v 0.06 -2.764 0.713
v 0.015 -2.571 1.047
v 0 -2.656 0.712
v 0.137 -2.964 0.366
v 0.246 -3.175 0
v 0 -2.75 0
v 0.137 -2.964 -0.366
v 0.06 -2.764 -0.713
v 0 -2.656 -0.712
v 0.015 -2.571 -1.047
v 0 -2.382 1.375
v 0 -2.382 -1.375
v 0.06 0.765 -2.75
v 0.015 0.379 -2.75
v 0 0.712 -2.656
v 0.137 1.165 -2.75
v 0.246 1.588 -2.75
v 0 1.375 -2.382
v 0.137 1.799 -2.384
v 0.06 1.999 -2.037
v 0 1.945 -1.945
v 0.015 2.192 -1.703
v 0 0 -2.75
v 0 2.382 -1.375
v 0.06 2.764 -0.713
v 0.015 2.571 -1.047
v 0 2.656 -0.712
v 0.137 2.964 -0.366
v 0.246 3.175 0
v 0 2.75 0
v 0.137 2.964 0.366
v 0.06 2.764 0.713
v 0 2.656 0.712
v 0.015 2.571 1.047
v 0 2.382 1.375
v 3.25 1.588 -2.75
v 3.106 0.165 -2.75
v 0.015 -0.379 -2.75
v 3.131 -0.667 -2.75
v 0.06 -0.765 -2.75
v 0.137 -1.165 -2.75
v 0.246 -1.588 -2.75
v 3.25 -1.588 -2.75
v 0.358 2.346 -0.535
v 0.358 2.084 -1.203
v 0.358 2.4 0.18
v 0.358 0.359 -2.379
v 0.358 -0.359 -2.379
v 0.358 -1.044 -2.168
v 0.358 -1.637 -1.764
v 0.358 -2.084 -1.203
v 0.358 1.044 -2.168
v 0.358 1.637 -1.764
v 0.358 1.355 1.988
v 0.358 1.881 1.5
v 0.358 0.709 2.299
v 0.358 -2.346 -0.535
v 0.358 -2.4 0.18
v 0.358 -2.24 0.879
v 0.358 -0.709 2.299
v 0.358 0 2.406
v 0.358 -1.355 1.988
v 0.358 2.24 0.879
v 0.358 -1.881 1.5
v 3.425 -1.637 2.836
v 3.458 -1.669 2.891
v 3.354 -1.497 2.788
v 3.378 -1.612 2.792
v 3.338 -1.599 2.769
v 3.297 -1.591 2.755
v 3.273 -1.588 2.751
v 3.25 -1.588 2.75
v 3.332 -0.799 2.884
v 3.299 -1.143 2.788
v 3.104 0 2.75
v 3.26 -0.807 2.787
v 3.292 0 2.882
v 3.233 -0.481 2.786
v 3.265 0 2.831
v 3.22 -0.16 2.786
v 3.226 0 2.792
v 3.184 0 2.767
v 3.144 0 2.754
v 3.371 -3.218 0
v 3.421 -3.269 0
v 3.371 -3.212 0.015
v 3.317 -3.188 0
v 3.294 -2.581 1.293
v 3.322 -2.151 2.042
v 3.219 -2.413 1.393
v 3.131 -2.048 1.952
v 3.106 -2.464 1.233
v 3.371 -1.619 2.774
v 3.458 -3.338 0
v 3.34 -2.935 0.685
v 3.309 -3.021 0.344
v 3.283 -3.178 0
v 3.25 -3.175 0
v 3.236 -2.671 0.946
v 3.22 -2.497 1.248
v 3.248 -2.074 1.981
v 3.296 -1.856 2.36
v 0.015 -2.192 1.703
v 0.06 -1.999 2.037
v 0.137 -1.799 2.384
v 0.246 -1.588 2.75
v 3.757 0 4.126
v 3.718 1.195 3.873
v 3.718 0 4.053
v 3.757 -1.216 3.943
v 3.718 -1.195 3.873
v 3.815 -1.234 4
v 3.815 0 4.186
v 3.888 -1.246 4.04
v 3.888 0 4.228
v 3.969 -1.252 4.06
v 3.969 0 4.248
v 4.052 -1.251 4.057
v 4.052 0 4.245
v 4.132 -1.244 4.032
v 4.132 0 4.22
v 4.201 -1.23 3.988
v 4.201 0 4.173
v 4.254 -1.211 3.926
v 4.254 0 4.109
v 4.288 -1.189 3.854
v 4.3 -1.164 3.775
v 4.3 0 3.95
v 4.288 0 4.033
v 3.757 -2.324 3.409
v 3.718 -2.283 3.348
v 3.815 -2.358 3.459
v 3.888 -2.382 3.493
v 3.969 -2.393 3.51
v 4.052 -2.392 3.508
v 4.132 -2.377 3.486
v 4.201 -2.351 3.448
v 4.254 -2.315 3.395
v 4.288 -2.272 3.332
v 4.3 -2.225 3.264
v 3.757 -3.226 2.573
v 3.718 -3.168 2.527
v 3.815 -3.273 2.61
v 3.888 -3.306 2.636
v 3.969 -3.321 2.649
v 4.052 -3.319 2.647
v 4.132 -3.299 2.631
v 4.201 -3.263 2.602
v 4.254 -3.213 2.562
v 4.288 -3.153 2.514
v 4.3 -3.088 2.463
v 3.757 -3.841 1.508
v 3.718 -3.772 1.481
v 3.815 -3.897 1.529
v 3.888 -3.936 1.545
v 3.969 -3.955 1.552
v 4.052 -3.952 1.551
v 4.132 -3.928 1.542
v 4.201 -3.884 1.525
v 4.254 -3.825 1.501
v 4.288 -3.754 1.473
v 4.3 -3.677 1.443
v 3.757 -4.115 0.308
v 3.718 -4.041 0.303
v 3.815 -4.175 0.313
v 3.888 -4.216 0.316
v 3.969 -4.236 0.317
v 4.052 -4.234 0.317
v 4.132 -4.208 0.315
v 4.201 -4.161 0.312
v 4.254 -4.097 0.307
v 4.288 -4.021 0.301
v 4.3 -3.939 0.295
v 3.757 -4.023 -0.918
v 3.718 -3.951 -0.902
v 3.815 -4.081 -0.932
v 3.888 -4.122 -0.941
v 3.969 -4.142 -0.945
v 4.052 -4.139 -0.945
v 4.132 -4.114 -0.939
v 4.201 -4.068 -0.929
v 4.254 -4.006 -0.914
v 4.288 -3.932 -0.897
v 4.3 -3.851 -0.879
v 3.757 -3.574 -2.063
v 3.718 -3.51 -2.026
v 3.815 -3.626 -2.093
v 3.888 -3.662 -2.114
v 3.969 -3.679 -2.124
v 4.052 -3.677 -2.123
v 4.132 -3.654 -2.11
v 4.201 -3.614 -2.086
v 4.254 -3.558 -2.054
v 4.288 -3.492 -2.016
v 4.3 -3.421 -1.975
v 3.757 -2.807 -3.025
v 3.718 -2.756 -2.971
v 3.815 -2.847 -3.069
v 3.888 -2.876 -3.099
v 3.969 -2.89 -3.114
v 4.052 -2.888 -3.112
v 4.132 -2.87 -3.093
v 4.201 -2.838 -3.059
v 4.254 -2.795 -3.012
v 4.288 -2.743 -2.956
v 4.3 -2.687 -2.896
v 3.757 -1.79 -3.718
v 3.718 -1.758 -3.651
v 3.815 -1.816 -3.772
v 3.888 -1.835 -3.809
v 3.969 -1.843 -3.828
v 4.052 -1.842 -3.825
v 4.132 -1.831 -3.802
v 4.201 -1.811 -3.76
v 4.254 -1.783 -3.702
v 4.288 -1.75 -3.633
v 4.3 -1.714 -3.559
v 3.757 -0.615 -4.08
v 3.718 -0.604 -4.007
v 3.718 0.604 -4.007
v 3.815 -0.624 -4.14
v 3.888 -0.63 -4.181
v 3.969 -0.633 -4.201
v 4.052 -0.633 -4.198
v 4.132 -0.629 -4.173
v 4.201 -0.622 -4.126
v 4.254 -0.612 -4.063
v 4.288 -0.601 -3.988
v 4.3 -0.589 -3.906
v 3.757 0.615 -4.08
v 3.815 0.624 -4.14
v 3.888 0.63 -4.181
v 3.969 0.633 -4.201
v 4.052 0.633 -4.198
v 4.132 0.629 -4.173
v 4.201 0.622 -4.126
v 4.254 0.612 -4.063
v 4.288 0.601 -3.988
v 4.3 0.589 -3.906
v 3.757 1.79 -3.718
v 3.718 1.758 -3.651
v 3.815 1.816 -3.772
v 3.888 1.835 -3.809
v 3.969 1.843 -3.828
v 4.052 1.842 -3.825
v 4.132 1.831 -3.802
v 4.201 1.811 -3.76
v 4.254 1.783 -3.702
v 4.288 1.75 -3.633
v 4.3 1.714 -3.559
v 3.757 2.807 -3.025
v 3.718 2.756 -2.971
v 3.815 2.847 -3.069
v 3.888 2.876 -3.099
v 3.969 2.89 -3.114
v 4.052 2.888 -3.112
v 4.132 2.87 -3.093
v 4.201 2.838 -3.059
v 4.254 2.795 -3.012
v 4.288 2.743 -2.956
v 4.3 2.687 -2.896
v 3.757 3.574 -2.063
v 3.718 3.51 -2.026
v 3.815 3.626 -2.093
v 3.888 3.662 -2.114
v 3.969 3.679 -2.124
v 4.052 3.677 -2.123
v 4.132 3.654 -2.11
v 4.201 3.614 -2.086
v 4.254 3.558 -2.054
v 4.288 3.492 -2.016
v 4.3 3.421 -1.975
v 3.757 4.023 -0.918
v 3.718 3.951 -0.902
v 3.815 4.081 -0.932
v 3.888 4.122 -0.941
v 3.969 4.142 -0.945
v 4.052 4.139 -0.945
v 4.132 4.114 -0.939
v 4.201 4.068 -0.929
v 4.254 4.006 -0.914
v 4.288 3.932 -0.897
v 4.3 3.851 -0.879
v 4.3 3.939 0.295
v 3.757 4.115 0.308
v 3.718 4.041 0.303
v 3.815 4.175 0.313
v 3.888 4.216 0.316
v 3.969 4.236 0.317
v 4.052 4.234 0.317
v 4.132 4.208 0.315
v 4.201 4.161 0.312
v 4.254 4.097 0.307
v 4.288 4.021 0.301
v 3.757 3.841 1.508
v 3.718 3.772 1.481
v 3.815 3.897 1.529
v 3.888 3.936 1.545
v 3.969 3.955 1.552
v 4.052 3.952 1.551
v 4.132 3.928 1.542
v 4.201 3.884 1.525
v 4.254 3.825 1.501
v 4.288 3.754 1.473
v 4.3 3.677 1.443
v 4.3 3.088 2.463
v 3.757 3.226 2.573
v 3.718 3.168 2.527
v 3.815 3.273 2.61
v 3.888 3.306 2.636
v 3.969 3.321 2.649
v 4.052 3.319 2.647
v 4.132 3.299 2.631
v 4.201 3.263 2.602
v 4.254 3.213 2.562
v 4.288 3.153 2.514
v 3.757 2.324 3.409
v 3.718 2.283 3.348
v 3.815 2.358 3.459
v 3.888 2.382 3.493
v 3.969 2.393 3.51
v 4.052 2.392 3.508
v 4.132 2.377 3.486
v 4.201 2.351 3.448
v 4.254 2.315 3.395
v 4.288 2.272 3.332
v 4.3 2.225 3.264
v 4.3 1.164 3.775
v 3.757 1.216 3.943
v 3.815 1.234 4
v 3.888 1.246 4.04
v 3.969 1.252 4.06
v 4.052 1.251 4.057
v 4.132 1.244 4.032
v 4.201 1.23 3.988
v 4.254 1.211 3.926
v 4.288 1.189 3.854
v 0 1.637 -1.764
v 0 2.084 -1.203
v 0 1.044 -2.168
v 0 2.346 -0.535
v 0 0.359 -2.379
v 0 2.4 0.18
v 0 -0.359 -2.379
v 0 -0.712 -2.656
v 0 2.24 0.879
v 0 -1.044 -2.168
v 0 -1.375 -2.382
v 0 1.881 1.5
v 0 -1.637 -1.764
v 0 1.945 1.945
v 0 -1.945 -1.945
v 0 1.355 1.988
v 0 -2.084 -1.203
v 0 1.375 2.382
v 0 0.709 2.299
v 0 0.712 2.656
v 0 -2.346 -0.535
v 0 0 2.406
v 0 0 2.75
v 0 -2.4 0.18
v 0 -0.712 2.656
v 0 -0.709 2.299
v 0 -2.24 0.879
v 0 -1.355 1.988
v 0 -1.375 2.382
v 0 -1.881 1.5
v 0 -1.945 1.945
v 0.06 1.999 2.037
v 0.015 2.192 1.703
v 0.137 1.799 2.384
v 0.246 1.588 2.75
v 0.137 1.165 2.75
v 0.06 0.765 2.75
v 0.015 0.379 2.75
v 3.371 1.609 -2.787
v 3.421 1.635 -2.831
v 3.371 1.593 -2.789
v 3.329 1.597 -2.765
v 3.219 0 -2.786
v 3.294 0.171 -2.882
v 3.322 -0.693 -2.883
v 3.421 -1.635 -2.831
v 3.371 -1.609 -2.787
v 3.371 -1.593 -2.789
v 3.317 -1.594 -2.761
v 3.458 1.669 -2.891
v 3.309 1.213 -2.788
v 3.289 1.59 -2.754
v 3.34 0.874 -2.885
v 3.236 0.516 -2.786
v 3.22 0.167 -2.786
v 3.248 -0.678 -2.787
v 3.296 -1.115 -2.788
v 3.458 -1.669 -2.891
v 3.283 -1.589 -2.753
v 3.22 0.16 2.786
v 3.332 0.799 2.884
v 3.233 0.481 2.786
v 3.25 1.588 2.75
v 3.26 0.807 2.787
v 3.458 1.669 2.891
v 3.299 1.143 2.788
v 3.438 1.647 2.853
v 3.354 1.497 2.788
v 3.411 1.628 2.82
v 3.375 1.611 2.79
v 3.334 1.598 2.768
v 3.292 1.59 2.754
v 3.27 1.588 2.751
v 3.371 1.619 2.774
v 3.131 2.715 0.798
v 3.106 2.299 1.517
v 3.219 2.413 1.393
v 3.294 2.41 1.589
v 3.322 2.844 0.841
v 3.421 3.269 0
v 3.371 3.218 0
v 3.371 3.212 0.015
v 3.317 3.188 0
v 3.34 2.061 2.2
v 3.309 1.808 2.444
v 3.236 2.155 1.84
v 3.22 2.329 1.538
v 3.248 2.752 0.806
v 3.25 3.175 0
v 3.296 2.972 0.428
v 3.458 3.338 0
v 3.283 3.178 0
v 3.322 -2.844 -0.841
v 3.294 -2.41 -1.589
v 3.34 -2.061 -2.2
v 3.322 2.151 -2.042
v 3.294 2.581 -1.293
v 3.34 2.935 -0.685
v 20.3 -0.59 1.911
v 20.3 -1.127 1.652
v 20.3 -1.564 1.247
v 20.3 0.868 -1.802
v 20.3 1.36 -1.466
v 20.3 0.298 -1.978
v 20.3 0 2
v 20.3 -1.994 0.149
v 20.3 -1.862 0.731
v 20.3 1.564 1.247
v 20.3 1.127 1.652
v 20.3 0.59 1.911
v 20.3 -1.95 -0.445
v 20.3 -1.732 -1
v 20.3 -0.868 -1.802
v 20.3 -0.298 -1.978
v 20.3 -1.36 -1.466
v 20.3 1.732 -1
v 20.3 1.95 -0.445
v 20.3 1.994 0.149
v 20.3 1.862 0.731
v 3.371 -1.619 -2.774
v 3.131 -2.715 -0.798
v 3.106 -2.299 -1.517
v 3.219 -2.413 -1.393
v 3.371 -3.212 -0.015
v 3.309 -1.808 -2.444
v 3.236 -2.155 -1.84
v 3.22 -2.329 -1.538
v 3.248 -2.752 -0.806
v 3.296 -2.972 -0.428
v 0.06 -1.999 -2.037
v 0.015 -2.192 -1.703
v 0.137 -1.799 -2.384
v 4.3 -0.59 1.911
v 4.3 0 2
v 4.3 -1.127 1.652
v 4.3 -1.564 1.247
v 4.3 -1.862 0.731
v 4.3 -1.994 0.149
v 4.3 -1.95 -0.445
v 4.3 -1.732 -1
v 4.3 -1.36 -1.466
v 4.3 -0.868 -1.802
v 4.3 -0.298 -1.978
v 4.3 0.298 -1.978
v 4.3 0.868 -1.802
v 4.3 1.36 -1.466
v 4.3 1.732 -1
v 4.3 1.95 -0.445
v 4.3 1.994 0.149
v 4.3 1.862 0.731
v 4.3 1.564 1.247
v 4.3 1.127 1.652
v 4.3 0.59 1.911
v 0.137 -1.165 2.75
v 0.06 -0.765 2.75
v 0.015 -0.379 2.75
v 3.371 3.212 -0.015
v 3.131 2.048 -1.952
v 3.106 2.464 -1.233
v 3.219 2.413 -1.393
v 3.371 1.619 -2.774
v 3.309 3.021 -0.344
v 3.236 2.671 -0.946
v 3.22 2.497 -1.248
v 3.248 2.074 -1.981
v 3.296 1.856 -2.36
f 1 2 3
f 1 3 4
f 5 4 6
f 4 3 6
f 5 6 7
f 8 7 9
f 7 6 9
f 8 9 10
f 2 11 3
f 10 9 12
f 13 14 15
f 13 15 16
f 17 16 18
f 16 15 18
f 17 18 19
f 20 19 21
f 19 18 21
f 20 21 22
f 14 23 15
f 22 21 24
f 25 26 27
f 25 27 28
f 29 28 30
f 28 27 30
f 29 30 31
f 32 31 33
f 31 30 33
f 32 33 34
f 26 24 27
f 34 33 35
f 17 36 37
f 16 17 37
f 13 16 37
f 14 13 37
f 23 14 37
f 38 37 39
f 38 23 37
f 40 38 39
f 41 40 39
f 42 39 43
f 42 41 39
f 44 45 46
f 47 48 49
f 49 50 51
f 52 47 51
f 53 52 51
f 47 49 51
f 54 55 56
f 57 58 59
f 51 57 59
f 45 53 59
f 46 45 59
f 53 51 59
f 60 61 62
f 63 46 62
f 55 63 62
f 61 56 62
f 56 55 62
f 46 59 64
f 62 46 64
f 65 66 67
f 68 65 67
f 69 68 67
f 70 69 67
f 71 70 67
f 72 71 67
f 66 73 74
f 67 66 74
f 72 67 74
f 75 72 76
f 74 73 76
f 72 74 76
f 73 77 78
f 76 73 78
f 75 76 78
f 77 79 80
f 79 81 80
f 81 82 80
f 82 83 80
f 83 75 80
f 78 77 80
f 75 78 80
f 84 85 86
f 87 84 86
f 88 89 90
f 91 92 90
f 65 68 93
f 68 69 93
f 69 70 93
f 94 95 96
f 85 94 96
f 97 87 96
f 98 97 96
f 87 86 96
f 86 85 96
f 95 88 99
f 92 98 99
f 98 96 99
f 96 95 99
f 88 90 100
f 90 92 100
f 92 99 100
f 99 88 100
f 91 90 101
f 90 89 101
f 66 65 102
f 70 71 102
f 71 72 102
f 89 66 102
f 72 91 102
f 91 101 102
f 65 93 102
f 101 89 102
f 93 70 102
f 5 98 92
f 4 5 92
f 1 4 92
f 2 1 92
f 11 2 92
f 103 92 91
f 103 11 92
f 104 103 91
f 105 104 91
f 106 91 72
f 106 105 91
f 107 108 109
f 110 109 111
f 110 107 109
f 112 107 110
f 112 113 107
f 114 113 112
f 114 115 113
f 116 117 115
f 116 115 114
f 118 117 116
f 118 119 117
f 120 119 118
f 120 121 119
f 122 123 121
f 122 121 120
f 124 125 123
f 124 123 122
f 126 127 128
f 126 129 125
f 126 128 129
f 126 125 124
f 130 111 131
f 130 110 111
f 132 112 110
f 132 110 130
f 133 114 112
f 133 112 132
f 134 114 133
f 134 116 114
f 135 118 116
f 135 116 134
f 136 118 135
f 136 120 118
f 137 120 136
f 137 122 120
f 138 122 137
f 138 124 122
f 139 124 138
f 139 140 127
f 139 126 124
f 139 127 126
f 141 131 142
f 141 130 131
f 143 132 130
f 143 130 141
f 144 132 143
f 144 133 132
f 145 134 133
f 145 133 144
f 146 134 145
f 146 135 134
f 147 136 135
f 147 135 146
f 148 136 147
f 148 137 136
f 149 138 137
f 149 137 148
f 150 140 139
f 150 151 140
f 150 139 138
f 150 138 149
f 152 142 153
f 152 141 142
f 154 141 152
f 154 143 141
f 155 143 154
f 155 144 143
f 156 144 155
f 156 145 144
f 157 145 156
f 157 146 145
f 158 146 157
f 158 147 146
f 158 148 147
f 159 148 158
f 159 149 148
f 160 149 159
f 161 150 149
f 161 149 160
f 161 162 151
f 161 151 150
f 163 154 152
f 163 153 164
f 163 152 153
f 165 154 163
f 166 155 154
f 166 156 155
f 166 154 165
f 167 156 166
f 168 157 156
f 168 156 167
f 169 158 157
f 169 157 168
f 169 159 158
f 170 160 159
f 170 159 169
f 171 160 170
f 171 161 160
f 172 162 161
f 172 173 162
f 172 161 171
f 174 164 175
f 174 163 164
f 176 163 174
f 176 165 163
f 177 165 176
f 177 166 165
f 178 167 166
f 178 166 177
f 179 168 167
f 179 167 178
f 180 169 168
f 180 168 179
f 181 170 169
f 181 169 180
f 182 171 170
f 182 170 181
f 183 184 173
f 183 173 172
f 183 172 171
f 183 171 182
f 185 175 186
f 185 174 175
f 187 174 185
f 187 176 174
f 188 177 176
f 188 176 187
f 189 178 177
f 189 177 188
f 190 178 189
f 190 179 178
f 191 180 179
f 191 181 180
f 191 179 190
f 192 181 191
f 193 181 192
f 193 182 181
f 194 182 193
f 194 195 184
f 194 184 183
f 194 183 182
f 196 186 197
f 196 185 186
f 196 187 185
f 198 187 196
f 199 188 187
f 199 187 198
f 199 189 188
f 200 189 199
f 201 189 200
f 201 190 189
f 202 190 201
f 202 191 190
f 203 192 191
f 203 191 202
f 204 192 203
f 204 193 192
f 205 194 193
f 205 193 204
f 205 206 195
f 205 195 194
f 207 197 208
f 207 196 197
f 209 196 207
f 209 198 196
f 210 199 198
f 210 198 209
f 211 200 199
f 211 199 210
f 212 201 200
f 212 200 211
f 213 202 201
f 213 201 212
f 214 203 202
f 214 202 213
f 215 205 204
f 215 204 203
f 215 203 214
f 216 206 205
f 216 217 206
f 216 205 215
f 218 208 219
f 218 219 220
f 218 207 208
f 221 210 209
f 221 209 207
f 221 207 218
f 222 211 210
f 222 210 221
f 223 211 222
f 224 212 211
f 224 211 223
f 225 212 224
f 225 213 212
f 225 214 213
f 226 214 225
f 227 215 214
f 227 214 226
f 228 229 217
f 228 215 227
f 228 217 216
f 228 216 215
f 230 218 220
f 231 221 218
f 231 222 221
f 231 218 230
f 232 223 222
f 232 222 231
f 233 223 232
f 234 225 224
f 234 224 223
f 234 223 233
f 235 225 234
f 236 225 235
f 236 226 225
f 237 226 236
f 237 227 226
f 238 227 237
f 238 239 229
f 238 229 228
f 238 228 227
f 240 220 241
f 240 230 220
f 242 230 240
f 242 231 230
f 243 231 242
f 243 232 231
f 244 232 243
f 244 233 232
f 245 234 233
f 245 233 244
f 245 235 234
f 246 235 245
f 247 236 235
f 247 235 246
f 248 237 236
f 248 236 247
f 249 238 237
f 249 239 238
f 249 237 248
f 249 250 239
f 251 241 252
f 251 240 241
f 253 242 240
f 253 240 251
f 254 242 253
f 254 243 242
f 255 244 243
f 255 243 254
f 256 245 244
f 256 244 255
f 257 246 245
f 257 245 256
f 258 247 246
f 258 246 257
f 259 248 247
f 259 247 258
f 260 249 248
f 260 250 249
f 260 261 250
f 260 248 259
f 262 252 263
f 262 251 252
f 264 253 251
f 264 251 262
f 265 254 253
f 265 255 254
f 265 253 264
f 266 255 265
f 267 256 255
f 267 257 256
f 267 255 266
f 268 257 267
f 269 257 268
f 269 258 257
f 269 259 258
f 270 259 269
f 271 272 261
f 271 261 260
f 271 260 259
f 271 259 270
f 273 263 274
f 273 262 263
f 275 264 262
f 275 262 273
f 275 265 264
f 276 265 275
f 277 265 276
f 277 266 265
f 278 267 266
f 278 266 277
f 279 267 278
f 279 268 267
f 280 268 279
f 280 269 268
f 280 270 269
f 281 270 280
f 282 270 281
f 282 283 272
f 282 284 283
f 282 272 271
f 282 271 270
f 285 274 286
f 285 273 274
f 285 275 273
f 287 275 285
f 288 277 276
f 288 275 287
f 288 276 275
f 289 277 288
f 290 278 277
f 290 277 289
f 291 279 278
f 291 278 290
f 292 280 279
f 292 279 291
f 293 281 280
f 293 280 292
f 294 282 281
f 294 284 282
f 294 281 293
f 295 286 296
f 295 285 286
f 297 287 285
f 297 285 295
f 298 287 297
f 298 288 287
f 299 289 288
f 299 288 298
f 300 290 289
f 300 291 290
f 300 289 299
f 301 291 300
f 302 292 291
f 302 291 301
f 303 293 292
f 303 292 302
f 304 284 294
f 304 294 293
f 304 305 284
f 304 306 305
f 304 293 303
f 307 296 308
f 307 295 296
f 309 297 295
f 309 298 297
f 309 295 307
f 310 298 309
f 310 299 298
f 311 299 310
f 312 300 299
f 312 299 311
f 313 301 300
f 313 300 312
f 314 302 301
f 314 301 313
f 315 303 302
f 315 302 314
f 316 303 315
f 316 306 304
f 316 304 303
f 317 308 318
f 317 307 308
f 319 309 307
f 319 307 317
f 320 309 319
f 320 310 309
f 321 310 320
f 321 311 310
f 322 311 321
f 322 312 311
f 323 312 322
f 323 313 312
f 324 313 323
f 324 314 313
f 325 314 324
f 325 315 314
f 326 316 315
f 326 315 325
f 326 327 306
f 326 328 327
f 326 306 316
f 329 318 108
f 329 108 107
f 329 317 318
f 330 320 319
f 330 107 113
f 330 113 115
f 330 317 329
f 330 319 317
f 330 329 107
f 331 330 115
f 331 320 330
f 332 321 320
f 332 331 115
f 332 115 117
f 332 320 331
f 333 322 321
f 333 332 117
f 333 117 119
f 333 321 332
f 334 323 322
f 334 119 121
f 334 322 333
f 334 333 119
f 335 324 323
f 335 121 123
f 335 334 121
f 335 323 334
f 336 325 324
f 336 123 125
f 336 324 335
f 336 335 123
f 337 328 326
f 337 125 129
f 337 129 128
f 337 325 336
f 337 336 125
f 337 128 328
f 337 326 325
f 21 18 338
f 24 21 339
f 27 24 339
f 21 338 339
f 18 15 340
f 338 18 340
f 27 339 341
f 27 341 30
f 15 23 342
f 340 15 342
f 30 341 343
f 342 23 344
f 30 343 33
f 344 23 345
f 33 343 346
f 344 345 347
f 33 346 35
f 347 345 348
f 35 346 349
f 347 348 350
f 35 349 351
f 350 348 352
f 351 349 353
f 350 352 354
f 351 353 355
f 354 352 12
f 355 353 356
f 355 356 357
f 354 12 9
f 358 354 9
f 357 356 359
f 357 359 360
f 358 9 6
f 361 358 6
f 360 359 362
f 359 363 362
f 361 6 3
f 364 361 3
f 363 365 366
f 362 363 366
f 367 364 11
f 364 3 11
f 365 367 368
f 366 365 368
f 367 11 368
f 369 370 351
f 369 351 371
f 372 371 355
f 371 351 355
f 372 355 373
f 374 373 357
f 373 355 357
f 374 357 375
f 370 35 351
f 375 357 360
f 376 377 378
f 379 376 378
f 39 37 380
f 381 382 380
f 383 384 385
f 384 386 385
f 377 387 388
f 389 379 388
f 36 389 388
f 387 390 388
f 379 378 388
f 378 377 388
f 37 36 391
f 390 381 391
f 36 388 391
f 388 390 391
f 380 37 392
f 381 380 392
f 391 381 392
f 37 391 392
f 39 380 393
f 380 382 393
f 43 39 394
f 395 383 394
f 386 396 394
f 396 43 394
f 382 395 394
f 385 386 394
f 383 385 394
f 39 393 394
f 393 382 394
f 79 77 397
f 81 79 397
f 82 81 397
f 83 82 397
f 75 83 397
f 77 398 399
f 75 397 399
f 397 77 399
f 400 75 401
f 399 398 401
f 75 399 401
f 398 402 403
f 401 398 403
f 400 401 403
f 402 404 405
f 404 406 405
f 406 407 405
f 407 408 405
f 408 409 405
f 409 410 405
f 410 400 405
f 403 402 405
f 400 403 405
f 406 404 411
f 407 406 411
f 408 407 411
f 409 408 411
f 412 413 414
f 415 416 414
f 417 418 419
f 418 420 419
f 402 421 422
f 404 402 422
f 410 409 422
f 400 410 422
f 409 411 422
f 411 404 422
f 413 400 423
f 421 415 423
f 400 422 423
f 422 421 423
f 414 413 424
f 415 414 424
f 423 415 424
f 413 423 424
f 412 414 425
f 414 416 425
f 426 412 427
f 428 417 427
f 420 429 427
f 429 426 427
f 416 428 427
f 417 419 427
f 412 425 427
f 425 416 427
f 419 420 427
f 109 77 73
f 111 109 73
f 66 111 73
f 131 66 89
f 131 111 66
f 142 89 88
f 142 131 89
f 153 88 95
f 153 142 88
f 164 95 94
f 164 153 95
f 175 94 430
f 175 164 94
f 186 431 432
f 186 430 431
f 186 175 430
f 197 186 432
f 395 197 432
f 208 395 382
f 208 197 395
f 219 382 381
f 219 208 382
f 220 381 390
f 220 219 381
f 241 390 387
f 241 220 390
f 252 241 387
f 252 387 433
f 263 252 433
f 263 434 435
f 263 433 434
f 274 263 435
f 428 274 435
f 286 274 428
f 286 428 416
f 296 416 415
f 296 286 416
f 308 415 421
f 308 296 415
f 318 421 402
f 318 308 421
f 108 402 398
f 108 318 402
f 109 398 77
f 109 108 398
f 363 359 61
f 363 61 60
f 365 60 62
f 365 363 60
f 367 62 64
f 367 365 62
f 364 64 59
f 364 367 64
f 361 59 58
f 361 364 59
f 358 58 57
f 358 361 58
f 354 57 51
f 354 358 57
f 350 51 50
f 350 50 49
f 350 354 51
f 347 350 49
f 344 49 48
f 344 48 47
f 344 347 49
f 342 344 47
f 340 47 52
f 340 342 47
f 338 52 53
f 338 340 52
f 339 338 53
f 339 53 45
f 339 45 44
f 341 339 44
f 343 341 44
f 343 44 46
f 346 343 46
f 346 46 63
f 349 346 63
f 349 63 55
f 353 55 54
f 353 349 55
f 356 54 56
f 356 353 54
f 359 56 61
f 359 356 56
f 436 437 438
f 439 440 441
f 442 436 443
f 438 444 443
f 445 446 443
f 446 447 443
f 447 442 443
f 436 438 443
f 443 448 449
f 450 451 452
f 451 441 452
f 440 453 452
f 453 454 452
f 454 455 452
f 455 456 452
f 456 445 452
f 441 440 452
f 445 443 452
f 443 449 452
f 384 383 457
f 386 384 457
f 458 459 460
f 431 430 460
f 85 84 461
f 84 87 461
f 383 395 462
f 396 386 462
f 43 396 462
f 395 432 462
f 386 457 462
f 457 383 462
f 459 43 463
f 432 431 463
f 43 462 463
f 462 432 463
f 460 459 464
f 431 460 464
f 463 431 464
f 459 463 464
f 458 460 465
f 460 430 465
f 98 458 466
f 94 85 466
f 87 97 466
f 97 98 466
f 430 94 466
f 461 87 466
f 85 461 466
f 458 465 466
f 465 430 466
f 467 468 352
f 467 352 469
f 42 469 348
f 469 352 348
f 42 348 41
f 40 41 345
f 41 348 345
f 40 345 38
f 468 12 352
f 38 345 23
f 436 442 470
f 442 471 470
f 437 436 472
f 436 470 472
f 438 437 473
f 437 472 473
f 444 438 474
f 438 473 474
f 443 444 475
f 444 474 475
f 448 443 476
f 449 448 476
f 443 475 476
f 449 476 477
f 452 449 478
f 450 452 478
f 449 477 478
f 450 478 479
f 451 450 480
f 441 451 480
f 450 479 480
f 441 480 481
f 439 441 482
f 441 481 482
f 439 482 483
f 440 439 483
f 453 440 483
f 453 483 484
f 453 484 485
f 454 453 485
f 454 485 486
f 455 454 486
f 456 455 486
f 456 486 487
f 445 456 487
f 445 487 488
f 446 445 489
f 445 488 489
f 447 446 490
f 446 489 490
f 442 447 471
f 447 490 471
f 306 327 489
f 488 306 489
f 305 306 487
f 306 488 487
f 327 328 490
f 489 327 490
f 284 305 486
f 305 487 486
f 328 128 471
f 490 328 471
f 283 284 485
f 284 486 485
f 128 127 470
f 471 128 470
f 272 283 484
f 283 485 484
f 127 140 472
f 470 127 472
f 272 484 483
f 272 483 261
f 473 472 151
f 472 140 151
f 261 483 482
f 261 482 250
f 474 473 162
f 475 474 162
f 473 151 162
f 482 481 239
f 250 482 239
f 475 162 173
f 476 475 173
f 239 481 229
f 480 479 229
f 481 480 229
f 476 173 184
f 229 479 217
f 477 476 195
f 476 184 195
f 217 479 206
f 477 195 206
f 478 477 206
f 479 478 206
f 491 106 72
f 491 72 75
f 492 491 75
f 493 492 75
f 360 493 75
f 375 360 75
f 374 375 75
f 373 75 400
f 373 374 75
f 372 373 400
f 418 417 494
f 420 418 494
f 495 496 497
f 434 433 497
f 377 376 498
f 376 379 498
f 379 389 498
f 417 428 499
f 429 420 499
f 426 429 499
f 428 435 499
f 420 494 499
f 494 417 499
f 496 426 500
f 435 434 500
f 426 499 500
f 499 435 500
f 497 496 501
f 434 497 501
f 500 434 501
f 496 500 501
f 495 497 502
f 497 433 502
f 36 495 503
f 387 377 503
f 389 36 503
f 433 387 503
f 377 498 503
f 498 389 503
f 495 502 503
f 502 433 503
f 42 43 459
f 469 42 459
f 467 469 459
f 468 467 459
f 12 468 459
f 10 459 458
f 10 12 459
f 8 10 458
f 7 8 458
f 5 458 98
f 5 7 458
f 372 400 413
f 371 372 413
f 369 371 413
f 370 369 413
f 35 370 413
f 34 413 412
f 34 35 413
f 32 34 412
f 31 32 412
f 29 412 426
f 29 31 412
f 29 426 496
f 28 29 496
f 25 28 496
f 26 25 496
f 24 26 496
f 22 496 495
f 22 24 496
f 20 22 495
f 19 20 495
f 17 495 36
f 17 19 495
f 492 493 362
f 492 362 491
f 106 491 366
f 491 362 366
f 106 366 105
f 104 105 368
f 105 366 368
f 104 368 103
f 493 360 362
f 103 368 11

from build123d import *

# Parameters (mm, degrees)
SKETCH2_R         = 3.207274827
HEX_DIE_DEPTH     = 4.3
FLANGEHEXFILLET_R = 0.2
SKETCH4_R         = 2.40625
INDENT_DEPTH      = 0.358333333


with BuildPart() as part:
    # BodySke → Base-Revolve (revolve)
    with BuildSketch(Plane.XY, mode=Mode.PRIVATE) as base_revolve_sk:
        Polygon((4.3, 2), (4.3, 3.17551963), (0.245673873, 3.17551963), (0, 2.75), (0, 0), (20.3, 0), (20.3, 2), align=None)
    revolve(base_revolve_sk.sketch.rotate(Axis((-25.4, 0, 0), (1, 0, 0)), 90), axis=Axis((-25.4, 0, 0), (1, 0, 0)))

    # Sketch2 → Hex-Die (cut)
    with BuildSketch(Plane(origin=(0, 0, 0), x_dir=(0, 0, -1), z_dir=(1, 0, 0))):
        Circle(SKETCH2_R)
        Polygon((-2.75, 1.587713247), (0, 3.175426494), (2.75, 1.587713247), (2.75, -1.587713247), (0, -3.175426494), (-2.75, -1.587713247), align=None, mode=Mode.SUBTRACT)
    extrude(amount=HEX_DIE_DEPTH, mode=Mode.SUBTRACT)

    # Sketch5 → Flange (revolve)
    with BuildSketch(Plane.XY, mode=Mode.PRIVATE) as flange_sk:
        with BuildLine():
            Line((2.243064243, 0), (3.718092214, 4.052606043))
            ThreePointArc((3.718092214, 4.052606043), (4.052094453, 4.245442326), (4.3, 3.95))
            Line((4.3, 3.95), (4.3, 0))
            Line((4.3, 0), (2.243064243, 0))
        make_face()
    revolve(flange_sk.sketch.rotate(Axis((0, 0, 0), (1, 0, 0)), 90), axis=Axis((0, 0, 0), (1, 0, 0)))

    # FlangeHexFillet
    flangehexfillet_edges = [part.edges().sort_by_distance(p)[0] for p in [
        (3.285203168, 0.797319684, 2.75),
        (3.24398239, 2.381569871, 1.375),
        (3.24398239, 2.381569871, -1.375),
        (3.243982387, 0, -2.75),
        (3.24398239, -2.381569871, -1.375),
        (3.24398239, -2.381569871, 1.375),
        (3.285203168, -0.797319684, 2.75),
    ]]
    fillet(flangehexfillet_edges, radius=FLANGEHEXFILLET_R)

    # Sketch4 → Indent (cut)
    with BuildSketch(Plane(origin=(0, 0, 0), x_dir=(0, 0, -1), z_dir=(1, 0, 0))):
        with Locations(Location((0, 0, 0), (0, 0, 180))):
            Circle(SKETCH4_R)
    extrude(amount=INDENT_DEPTH, mode=Mode.SUBTRACT)


solid = part.part
